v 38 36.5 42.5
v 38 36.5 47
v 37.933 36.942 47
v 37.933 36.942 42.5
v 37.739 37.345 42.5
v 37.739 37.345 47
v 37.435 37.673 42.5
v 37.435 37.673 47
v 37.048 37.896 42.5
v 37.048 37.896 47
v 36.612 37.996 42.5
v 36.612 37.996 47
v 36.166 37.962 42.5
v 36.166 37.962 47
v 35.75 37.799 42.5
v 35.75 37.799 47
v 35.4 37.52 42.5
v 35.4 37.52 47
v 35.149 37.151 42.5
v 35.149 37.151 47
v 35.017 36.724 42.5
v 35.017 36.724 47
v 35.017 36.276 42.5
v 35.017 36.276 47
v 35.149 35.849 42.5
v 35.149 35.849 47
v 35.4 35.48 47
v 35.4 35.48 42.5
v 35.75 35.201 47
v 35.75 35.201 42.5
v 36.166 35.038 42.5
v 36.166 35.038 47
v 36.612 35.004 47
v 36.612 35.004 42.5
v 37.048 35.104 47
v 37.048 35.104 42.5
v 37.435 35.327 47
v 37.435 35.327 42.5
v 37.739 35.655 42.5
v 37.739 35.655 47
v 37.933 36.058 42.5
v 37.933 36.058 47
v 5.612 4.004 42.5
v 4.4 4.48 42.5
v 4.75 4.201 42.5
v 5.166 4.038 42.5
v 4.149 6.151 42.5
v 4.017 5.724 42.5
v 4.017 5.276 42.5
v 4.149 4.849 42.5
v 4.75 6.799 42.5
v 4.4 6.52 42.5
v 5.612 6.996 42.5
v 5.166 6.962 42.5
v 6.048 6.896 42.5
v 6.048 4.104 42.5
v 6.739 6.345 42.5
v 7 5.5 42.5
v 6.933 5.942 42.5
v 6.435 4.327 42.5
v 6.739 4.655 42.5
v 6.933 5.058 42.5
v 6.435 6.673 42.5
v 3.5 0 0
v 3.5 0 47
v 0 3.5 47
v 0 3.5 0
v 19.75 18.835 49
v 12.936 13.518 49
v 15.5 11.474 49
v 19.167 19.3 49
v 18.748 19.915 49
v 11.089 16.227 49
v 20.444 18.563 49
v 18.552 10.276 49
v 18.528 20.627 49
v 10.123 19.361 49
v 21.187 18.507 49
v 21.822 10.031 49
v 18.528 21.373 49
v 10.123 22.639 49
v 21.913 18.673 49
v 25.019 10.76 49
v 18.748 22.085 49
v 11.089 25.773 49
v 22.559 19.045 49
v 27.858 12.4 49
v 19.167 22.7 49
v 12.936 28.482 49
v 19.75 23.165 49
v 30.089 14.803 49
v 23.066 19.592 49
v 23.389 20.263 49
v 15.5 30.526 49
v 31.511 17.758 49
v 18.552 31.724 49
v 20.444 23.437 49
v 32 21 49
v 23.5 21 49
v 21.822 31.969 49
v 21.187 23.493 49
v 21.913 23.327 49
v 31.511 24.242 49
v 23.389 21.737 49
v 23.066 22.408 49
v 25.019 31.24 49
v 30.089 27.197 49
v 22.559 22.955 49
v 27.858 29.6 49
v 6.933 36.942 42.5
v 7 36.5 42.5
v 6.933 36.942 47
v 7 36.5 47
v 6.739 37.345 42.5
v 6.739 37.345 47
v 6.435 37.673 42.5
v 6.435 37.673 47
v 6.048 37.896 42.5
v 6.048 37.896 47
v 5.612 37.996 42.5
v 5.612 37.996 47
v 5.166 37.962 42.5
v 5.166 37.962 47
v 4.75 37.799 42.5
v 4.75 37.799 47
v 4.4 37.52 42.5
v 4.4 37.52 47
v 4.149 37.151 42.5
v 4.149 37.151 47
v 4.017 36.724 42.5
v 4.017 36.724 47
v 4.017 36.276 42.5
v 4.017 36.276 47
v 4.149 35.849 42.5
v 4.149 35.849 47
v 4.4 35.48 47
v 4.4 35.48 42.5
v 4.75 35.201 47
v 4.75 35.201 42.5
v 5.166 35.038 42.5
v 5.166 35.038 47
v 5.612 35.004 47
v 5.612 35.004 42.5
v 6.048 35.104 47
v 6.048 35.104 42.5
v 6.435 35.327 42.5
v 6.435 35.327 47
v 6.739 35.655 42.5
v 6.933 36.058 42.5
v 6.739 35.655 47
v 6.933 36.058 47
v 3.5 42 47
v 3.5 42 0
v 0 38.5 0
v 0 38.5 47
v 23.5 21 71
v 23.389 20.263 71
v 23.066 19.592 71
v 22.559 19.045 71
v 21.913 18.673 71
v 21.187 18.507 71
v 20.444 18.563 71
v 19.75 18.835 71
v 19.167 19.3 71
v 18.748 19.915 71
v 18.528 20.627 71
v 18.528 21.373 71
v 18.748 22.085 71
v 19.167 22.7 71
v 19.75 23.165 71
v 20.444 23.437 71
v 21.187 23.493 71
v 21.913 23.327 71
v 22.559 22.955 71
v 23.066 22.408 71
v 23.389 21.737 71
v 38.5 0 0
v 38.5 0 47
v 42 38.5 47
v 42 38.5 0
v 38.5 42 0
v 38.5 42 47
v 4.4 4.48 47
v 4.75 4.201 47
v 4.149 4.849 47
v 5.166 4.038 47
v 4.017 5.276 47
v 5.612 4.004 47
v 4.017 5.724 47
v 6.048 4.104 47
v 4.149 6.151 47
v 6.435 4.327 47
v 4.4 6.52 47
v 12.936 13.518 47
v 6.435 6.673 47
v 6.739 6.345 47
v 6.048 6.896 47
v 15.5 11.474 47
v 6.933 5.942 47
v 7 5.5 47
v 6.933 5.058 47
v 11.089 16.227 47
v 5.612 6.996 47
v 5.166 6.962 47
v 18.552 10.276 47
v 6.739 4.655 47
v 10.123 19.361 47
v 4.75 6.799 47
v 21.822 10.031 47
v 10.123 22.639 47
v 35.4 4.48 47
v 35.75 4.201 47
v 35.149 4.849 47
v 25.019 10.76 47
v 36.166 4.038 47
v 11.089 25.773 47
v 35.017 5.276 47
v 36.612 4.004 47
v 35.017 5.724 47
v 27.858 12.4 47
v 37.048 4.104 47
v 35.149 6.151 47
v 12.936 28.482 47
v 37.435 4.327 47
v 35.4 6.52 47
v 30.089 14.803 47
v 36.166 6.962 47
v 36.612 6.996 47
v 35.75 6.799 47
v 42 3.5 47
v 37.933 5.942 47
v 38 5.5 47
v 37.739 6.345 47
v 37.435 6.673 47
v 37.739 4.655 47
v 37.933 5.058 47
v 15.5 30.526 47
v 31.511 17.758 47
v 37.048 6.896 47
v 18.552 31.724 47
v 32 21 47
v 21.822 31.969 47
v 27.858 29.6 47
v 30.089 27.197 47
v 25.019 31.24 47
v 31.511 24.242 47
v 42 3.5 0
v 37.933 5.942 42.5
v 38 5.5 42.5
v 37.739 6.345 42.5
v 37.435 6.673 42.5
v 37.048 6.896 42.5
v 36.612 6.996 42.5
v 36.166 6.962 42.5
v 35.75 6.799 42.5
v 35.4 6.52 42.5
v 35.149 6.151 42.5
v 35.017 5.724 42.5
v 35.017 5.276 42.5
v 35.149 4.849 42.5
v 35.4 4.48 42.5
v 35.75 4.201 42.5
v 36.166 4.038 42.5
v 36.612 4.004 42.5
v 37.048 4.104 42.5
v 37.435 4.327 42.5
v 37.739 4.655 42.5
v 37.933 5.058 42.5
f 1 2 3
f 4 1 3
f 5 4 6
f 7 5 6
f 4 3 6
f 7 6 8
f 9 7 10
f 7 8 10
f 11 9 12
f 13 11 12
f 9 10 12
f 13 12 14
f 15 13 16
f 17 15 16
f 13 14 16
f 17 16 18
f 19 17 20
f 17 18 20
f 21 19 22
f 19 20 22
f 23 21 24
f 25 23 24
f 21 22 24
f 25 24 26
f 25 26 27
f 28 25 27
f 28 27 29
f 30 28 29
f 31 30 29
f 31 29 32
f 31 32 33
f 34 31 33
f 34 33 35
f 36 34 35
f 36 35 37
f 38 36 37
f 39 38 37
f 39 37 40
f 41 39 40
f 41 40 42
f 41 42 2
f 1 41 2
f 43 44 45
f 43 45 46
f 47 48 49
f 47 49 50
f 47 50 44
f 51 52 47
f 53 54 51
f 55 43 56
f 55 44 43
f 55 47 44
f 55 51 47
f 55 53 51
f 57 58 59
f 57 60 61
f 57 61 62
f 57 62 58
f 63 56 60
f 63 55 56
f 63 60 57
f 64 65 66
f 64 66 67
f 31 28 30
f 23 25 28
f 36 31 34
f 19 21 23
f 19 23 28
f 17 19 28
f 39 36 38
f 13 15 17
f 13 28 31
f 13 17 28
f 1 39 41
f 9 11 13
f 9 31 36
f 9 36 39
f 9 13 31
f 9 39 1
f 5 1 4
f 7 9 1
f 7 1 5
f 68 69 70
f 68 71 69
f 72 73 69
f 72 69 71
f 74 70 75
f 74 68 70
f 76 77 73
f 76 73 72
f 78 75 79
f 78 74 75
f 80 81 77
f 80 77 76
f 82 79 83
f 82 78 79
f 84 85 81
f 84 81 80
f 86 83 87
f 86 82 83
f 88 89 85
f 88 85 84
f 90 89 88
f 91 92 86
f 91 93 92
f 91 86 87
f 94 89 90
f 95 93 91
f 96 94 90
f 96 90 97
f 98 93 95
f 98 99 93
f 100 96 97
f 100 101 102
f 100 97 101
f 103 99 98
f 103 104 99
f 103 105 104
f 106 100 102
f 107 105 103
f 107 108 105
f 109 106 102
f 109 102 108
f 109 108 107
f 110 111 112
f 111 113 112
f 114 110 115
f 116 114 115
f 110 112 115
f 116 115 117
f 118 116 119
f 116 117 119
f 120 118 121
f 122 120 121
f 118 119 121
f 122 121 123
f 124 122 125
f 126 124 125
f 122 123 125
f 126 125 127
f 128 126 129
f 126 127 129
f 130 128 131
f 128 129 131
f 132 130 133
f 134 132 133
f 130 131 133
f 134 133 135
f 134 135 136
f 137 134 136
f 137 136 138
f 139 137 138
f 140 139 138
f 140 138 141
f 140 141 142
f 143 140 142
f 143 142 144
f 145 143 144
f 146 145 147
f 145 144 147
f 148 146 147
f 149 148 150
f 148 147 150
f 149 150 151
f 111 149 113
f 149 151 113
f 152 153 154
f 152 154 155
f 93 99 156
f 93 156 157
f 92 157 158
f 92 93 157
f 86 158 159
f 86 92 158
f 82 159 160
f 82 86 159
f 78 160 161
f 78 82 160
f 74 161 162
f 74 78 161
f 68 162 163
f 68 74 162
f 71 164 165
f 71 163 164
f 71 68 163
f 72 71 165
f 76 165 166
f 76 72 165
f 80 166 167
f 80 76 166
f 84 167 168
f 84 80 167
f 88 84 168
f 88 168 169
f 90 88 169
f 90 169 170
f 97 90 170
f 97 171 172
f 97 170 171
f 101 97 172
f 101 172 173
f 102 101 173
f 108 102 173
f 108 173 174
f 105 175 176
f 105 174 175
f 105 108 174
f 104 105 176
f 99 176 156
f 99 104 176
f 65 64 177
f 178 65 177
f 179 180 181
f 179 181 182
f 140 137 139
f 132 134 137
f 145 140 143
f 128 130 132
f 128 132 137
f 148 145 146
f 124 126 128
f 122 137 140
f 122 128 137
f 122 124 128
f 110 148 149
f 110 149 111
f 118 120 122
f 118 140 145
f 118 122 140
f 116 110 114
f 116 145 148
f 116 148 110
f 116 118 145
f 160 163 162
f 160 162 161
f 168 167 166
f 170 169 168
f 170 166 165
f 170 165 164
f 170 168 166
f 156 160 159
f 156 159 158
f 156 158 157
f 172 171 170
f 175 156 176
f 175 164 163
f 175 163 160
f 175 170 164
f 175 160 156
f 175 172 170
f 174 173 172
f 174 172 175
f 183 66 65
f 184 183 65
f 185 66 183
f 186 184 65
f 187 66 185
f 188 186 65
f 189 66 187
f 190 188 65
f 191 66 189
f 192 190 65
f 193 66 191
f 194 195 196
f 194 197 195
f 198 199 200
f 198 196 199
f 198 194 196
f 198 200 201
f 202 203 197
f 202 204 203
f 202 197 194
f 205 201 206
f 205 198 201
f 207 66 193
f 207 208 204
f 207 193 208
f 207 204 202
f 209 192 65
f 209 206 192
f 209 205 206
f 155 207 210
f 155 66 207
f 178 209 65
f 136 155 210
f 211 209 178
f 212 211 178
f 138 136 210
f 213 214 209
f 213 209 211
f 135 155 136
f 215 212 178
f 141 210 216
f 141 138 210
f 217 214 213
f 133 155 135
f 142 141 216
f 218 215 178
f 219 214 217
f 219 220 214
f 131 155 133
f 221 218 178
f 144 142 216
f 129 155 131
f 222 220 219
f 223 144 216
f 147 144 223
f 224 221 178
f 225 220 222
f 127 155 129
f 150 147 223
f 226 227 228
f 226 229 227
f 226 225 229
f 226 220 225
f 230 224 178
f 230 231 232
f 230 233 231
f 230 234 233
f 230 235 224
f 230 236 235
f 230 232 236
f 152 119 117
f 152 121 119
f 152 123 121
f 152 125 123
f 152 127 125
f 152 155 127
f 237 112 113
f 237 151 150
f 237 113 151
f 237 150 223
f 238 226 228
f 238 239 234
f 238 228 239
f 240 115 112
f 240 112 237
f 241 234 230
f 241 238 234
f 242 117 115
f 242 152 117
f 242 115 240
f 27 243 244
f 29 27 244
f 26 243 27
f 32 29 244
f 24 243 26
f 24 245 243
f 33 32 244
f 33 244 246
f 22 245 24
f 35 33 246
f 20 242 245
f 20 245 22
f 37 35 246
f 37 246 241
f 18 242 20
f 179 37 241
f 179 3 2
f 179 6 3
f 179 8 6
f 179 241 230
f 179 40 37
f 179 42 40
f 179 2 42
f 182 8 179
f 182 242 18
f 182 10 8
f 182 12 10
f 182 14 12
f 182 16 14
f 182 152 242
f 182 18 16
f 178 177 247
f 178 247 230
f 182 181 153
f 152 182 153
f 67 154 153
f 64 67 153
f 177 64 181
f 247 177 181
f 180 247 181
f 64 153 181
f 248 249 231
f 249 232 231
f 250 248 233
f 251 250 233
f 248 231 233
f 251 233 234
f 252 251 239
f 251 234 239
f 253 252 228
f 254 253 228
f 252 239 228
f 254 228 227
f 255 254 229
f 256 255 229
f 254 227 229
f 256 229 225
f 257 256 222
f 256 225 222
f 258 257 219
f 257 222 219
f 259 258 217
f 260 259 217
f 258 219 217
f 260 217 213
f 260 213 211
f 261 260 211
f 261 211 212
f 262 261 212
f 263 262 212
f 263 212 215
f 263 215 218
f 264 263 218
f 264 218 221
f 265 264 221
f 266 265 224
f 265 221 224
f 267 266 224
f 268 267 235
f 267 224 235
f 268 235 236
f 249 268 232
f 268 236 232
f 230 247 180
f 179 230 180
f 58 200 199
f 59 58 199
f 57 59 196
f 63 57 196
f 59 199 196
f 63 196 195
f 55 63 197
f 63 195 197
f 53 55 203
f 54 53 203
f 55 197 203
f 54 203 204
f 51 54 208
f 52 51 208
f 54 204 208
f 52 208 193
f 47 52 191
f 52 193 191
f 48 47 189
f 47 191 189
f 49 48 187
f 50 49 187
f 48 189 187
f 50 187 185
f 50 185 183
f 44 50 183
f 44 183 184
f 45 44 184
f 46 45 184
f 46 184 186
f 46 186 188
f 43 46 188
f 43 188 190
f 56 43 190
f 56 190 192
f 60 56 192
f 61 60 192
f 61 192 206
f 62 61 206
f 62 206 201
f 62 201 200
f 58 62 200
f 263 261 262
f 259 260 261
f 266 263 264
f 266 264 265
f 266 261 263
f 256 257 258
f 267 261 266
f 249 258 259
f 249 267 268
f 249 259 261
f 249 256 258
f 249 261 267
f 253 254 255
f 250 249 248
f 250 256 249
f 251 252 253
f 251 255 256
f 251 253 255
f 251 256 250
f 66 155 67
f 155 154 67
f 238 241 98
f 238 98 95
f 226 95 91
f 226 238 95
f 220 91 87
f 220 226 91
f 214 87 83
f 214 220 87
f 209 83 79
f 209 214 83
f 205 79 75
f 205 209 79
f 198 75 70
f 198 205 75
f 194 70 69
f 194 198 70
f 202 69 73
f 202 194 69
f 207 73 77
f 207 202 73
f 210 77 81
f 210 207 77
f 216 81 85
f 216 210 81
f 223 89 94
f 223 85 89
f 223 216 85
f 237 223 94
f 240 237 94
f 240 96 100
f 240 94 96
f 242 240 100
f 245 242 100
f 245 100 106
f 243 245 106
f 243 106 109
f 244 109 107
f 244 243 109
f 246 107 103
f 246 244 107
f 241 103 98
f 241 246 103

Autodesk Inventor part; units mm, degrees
ref_plane "YZ Plane" through (0, 0, 0) normal (1, 0, 0) x (0, 1, 0)
ref_plane "XZ Plane" through (0, 0, 0) normal (0, 1, 0) x (-1, 0, 0)
ref_plane "XY Plane" through (0, 0, 0) normal (0, 0, 1) x (1, 0, 0)
sketch "Sketch1" plane through (0, 0, 0) normal (0, 0, 1) x (1, 0, 0)
  line L0 (0, 0) -> (42, 0)
  line L1 (42, 0) -> (42, 42)
  line L2 (42, 42) -> (0, 42)
  line L3 (0, 42) -> (0, 0)
  dimension "d0" = 42
  dimension "d1" = 42
extrude "Extrusion1" add sketch "Sketch1" along normal blind 47
chamfer "Chamfer1" distance 3.5 angle 45 4 edges at (0, 42, 23.5) (0, 0, 23.5) (42, 0, 23.5) (42, 42, 23.5)
sketch "Sketch2" plane through (0, 0, 47) normal (0, 0, 1) x (1, 0, 0)
  circle A0 centre (21, 21) radius 11
  point P0 (0, 0)
  dimension "d7" = 22
extrude "Extrusion2" add sketch "Sketch2" along normal blind 2
sketch "Sketch3" plane through (21, 21, 49) normal (0, 0, 1) x (1, 0, 0)
  circle A0 centre (0, 0) radius 11 projected
  circle A1 centre (0, 0) radius 2.5
  point P0 (-21, -21)
  dimension "d10" = 5
extrude "Extrusion3" add sketch "Sketch3" along normal blind 22 contours A1
sketch "Sketch4" plane through (0, 0, 47) normal (0, 0, 1) x (1, 0, 0)
  line L0 (0, 38.5) -> (0, 3.5) projected
  line L1 (3.5, 0) -> (38.5, 0) projected
  circle A0 centre (5.5, 36.5) radius 1.5
  circle A1 centre (36.5, 36.5) radius 1.5
  circle A2 centre (36.5, 5.5) radius 1.5
  circle A3 centre (5.5, 5.5) radius 1.5
  point P0 (0, 0)
  dimension "d13" = 3
  dimension "d14" = 3
  dimension "d15" = 3
  dimension "d16" = 3
  dimension "d17" = 31
  dimension "d18" = 31
  dimension "d19" = 31
  dimension "d20" = 31
  dimension "d21" = 5.5
  dimension "d22" = 5.5
extrude "Extrusion4" cut sketch "Sketch4" against normal blind 4.5
properties part number "NEMA17StepperMotor"
